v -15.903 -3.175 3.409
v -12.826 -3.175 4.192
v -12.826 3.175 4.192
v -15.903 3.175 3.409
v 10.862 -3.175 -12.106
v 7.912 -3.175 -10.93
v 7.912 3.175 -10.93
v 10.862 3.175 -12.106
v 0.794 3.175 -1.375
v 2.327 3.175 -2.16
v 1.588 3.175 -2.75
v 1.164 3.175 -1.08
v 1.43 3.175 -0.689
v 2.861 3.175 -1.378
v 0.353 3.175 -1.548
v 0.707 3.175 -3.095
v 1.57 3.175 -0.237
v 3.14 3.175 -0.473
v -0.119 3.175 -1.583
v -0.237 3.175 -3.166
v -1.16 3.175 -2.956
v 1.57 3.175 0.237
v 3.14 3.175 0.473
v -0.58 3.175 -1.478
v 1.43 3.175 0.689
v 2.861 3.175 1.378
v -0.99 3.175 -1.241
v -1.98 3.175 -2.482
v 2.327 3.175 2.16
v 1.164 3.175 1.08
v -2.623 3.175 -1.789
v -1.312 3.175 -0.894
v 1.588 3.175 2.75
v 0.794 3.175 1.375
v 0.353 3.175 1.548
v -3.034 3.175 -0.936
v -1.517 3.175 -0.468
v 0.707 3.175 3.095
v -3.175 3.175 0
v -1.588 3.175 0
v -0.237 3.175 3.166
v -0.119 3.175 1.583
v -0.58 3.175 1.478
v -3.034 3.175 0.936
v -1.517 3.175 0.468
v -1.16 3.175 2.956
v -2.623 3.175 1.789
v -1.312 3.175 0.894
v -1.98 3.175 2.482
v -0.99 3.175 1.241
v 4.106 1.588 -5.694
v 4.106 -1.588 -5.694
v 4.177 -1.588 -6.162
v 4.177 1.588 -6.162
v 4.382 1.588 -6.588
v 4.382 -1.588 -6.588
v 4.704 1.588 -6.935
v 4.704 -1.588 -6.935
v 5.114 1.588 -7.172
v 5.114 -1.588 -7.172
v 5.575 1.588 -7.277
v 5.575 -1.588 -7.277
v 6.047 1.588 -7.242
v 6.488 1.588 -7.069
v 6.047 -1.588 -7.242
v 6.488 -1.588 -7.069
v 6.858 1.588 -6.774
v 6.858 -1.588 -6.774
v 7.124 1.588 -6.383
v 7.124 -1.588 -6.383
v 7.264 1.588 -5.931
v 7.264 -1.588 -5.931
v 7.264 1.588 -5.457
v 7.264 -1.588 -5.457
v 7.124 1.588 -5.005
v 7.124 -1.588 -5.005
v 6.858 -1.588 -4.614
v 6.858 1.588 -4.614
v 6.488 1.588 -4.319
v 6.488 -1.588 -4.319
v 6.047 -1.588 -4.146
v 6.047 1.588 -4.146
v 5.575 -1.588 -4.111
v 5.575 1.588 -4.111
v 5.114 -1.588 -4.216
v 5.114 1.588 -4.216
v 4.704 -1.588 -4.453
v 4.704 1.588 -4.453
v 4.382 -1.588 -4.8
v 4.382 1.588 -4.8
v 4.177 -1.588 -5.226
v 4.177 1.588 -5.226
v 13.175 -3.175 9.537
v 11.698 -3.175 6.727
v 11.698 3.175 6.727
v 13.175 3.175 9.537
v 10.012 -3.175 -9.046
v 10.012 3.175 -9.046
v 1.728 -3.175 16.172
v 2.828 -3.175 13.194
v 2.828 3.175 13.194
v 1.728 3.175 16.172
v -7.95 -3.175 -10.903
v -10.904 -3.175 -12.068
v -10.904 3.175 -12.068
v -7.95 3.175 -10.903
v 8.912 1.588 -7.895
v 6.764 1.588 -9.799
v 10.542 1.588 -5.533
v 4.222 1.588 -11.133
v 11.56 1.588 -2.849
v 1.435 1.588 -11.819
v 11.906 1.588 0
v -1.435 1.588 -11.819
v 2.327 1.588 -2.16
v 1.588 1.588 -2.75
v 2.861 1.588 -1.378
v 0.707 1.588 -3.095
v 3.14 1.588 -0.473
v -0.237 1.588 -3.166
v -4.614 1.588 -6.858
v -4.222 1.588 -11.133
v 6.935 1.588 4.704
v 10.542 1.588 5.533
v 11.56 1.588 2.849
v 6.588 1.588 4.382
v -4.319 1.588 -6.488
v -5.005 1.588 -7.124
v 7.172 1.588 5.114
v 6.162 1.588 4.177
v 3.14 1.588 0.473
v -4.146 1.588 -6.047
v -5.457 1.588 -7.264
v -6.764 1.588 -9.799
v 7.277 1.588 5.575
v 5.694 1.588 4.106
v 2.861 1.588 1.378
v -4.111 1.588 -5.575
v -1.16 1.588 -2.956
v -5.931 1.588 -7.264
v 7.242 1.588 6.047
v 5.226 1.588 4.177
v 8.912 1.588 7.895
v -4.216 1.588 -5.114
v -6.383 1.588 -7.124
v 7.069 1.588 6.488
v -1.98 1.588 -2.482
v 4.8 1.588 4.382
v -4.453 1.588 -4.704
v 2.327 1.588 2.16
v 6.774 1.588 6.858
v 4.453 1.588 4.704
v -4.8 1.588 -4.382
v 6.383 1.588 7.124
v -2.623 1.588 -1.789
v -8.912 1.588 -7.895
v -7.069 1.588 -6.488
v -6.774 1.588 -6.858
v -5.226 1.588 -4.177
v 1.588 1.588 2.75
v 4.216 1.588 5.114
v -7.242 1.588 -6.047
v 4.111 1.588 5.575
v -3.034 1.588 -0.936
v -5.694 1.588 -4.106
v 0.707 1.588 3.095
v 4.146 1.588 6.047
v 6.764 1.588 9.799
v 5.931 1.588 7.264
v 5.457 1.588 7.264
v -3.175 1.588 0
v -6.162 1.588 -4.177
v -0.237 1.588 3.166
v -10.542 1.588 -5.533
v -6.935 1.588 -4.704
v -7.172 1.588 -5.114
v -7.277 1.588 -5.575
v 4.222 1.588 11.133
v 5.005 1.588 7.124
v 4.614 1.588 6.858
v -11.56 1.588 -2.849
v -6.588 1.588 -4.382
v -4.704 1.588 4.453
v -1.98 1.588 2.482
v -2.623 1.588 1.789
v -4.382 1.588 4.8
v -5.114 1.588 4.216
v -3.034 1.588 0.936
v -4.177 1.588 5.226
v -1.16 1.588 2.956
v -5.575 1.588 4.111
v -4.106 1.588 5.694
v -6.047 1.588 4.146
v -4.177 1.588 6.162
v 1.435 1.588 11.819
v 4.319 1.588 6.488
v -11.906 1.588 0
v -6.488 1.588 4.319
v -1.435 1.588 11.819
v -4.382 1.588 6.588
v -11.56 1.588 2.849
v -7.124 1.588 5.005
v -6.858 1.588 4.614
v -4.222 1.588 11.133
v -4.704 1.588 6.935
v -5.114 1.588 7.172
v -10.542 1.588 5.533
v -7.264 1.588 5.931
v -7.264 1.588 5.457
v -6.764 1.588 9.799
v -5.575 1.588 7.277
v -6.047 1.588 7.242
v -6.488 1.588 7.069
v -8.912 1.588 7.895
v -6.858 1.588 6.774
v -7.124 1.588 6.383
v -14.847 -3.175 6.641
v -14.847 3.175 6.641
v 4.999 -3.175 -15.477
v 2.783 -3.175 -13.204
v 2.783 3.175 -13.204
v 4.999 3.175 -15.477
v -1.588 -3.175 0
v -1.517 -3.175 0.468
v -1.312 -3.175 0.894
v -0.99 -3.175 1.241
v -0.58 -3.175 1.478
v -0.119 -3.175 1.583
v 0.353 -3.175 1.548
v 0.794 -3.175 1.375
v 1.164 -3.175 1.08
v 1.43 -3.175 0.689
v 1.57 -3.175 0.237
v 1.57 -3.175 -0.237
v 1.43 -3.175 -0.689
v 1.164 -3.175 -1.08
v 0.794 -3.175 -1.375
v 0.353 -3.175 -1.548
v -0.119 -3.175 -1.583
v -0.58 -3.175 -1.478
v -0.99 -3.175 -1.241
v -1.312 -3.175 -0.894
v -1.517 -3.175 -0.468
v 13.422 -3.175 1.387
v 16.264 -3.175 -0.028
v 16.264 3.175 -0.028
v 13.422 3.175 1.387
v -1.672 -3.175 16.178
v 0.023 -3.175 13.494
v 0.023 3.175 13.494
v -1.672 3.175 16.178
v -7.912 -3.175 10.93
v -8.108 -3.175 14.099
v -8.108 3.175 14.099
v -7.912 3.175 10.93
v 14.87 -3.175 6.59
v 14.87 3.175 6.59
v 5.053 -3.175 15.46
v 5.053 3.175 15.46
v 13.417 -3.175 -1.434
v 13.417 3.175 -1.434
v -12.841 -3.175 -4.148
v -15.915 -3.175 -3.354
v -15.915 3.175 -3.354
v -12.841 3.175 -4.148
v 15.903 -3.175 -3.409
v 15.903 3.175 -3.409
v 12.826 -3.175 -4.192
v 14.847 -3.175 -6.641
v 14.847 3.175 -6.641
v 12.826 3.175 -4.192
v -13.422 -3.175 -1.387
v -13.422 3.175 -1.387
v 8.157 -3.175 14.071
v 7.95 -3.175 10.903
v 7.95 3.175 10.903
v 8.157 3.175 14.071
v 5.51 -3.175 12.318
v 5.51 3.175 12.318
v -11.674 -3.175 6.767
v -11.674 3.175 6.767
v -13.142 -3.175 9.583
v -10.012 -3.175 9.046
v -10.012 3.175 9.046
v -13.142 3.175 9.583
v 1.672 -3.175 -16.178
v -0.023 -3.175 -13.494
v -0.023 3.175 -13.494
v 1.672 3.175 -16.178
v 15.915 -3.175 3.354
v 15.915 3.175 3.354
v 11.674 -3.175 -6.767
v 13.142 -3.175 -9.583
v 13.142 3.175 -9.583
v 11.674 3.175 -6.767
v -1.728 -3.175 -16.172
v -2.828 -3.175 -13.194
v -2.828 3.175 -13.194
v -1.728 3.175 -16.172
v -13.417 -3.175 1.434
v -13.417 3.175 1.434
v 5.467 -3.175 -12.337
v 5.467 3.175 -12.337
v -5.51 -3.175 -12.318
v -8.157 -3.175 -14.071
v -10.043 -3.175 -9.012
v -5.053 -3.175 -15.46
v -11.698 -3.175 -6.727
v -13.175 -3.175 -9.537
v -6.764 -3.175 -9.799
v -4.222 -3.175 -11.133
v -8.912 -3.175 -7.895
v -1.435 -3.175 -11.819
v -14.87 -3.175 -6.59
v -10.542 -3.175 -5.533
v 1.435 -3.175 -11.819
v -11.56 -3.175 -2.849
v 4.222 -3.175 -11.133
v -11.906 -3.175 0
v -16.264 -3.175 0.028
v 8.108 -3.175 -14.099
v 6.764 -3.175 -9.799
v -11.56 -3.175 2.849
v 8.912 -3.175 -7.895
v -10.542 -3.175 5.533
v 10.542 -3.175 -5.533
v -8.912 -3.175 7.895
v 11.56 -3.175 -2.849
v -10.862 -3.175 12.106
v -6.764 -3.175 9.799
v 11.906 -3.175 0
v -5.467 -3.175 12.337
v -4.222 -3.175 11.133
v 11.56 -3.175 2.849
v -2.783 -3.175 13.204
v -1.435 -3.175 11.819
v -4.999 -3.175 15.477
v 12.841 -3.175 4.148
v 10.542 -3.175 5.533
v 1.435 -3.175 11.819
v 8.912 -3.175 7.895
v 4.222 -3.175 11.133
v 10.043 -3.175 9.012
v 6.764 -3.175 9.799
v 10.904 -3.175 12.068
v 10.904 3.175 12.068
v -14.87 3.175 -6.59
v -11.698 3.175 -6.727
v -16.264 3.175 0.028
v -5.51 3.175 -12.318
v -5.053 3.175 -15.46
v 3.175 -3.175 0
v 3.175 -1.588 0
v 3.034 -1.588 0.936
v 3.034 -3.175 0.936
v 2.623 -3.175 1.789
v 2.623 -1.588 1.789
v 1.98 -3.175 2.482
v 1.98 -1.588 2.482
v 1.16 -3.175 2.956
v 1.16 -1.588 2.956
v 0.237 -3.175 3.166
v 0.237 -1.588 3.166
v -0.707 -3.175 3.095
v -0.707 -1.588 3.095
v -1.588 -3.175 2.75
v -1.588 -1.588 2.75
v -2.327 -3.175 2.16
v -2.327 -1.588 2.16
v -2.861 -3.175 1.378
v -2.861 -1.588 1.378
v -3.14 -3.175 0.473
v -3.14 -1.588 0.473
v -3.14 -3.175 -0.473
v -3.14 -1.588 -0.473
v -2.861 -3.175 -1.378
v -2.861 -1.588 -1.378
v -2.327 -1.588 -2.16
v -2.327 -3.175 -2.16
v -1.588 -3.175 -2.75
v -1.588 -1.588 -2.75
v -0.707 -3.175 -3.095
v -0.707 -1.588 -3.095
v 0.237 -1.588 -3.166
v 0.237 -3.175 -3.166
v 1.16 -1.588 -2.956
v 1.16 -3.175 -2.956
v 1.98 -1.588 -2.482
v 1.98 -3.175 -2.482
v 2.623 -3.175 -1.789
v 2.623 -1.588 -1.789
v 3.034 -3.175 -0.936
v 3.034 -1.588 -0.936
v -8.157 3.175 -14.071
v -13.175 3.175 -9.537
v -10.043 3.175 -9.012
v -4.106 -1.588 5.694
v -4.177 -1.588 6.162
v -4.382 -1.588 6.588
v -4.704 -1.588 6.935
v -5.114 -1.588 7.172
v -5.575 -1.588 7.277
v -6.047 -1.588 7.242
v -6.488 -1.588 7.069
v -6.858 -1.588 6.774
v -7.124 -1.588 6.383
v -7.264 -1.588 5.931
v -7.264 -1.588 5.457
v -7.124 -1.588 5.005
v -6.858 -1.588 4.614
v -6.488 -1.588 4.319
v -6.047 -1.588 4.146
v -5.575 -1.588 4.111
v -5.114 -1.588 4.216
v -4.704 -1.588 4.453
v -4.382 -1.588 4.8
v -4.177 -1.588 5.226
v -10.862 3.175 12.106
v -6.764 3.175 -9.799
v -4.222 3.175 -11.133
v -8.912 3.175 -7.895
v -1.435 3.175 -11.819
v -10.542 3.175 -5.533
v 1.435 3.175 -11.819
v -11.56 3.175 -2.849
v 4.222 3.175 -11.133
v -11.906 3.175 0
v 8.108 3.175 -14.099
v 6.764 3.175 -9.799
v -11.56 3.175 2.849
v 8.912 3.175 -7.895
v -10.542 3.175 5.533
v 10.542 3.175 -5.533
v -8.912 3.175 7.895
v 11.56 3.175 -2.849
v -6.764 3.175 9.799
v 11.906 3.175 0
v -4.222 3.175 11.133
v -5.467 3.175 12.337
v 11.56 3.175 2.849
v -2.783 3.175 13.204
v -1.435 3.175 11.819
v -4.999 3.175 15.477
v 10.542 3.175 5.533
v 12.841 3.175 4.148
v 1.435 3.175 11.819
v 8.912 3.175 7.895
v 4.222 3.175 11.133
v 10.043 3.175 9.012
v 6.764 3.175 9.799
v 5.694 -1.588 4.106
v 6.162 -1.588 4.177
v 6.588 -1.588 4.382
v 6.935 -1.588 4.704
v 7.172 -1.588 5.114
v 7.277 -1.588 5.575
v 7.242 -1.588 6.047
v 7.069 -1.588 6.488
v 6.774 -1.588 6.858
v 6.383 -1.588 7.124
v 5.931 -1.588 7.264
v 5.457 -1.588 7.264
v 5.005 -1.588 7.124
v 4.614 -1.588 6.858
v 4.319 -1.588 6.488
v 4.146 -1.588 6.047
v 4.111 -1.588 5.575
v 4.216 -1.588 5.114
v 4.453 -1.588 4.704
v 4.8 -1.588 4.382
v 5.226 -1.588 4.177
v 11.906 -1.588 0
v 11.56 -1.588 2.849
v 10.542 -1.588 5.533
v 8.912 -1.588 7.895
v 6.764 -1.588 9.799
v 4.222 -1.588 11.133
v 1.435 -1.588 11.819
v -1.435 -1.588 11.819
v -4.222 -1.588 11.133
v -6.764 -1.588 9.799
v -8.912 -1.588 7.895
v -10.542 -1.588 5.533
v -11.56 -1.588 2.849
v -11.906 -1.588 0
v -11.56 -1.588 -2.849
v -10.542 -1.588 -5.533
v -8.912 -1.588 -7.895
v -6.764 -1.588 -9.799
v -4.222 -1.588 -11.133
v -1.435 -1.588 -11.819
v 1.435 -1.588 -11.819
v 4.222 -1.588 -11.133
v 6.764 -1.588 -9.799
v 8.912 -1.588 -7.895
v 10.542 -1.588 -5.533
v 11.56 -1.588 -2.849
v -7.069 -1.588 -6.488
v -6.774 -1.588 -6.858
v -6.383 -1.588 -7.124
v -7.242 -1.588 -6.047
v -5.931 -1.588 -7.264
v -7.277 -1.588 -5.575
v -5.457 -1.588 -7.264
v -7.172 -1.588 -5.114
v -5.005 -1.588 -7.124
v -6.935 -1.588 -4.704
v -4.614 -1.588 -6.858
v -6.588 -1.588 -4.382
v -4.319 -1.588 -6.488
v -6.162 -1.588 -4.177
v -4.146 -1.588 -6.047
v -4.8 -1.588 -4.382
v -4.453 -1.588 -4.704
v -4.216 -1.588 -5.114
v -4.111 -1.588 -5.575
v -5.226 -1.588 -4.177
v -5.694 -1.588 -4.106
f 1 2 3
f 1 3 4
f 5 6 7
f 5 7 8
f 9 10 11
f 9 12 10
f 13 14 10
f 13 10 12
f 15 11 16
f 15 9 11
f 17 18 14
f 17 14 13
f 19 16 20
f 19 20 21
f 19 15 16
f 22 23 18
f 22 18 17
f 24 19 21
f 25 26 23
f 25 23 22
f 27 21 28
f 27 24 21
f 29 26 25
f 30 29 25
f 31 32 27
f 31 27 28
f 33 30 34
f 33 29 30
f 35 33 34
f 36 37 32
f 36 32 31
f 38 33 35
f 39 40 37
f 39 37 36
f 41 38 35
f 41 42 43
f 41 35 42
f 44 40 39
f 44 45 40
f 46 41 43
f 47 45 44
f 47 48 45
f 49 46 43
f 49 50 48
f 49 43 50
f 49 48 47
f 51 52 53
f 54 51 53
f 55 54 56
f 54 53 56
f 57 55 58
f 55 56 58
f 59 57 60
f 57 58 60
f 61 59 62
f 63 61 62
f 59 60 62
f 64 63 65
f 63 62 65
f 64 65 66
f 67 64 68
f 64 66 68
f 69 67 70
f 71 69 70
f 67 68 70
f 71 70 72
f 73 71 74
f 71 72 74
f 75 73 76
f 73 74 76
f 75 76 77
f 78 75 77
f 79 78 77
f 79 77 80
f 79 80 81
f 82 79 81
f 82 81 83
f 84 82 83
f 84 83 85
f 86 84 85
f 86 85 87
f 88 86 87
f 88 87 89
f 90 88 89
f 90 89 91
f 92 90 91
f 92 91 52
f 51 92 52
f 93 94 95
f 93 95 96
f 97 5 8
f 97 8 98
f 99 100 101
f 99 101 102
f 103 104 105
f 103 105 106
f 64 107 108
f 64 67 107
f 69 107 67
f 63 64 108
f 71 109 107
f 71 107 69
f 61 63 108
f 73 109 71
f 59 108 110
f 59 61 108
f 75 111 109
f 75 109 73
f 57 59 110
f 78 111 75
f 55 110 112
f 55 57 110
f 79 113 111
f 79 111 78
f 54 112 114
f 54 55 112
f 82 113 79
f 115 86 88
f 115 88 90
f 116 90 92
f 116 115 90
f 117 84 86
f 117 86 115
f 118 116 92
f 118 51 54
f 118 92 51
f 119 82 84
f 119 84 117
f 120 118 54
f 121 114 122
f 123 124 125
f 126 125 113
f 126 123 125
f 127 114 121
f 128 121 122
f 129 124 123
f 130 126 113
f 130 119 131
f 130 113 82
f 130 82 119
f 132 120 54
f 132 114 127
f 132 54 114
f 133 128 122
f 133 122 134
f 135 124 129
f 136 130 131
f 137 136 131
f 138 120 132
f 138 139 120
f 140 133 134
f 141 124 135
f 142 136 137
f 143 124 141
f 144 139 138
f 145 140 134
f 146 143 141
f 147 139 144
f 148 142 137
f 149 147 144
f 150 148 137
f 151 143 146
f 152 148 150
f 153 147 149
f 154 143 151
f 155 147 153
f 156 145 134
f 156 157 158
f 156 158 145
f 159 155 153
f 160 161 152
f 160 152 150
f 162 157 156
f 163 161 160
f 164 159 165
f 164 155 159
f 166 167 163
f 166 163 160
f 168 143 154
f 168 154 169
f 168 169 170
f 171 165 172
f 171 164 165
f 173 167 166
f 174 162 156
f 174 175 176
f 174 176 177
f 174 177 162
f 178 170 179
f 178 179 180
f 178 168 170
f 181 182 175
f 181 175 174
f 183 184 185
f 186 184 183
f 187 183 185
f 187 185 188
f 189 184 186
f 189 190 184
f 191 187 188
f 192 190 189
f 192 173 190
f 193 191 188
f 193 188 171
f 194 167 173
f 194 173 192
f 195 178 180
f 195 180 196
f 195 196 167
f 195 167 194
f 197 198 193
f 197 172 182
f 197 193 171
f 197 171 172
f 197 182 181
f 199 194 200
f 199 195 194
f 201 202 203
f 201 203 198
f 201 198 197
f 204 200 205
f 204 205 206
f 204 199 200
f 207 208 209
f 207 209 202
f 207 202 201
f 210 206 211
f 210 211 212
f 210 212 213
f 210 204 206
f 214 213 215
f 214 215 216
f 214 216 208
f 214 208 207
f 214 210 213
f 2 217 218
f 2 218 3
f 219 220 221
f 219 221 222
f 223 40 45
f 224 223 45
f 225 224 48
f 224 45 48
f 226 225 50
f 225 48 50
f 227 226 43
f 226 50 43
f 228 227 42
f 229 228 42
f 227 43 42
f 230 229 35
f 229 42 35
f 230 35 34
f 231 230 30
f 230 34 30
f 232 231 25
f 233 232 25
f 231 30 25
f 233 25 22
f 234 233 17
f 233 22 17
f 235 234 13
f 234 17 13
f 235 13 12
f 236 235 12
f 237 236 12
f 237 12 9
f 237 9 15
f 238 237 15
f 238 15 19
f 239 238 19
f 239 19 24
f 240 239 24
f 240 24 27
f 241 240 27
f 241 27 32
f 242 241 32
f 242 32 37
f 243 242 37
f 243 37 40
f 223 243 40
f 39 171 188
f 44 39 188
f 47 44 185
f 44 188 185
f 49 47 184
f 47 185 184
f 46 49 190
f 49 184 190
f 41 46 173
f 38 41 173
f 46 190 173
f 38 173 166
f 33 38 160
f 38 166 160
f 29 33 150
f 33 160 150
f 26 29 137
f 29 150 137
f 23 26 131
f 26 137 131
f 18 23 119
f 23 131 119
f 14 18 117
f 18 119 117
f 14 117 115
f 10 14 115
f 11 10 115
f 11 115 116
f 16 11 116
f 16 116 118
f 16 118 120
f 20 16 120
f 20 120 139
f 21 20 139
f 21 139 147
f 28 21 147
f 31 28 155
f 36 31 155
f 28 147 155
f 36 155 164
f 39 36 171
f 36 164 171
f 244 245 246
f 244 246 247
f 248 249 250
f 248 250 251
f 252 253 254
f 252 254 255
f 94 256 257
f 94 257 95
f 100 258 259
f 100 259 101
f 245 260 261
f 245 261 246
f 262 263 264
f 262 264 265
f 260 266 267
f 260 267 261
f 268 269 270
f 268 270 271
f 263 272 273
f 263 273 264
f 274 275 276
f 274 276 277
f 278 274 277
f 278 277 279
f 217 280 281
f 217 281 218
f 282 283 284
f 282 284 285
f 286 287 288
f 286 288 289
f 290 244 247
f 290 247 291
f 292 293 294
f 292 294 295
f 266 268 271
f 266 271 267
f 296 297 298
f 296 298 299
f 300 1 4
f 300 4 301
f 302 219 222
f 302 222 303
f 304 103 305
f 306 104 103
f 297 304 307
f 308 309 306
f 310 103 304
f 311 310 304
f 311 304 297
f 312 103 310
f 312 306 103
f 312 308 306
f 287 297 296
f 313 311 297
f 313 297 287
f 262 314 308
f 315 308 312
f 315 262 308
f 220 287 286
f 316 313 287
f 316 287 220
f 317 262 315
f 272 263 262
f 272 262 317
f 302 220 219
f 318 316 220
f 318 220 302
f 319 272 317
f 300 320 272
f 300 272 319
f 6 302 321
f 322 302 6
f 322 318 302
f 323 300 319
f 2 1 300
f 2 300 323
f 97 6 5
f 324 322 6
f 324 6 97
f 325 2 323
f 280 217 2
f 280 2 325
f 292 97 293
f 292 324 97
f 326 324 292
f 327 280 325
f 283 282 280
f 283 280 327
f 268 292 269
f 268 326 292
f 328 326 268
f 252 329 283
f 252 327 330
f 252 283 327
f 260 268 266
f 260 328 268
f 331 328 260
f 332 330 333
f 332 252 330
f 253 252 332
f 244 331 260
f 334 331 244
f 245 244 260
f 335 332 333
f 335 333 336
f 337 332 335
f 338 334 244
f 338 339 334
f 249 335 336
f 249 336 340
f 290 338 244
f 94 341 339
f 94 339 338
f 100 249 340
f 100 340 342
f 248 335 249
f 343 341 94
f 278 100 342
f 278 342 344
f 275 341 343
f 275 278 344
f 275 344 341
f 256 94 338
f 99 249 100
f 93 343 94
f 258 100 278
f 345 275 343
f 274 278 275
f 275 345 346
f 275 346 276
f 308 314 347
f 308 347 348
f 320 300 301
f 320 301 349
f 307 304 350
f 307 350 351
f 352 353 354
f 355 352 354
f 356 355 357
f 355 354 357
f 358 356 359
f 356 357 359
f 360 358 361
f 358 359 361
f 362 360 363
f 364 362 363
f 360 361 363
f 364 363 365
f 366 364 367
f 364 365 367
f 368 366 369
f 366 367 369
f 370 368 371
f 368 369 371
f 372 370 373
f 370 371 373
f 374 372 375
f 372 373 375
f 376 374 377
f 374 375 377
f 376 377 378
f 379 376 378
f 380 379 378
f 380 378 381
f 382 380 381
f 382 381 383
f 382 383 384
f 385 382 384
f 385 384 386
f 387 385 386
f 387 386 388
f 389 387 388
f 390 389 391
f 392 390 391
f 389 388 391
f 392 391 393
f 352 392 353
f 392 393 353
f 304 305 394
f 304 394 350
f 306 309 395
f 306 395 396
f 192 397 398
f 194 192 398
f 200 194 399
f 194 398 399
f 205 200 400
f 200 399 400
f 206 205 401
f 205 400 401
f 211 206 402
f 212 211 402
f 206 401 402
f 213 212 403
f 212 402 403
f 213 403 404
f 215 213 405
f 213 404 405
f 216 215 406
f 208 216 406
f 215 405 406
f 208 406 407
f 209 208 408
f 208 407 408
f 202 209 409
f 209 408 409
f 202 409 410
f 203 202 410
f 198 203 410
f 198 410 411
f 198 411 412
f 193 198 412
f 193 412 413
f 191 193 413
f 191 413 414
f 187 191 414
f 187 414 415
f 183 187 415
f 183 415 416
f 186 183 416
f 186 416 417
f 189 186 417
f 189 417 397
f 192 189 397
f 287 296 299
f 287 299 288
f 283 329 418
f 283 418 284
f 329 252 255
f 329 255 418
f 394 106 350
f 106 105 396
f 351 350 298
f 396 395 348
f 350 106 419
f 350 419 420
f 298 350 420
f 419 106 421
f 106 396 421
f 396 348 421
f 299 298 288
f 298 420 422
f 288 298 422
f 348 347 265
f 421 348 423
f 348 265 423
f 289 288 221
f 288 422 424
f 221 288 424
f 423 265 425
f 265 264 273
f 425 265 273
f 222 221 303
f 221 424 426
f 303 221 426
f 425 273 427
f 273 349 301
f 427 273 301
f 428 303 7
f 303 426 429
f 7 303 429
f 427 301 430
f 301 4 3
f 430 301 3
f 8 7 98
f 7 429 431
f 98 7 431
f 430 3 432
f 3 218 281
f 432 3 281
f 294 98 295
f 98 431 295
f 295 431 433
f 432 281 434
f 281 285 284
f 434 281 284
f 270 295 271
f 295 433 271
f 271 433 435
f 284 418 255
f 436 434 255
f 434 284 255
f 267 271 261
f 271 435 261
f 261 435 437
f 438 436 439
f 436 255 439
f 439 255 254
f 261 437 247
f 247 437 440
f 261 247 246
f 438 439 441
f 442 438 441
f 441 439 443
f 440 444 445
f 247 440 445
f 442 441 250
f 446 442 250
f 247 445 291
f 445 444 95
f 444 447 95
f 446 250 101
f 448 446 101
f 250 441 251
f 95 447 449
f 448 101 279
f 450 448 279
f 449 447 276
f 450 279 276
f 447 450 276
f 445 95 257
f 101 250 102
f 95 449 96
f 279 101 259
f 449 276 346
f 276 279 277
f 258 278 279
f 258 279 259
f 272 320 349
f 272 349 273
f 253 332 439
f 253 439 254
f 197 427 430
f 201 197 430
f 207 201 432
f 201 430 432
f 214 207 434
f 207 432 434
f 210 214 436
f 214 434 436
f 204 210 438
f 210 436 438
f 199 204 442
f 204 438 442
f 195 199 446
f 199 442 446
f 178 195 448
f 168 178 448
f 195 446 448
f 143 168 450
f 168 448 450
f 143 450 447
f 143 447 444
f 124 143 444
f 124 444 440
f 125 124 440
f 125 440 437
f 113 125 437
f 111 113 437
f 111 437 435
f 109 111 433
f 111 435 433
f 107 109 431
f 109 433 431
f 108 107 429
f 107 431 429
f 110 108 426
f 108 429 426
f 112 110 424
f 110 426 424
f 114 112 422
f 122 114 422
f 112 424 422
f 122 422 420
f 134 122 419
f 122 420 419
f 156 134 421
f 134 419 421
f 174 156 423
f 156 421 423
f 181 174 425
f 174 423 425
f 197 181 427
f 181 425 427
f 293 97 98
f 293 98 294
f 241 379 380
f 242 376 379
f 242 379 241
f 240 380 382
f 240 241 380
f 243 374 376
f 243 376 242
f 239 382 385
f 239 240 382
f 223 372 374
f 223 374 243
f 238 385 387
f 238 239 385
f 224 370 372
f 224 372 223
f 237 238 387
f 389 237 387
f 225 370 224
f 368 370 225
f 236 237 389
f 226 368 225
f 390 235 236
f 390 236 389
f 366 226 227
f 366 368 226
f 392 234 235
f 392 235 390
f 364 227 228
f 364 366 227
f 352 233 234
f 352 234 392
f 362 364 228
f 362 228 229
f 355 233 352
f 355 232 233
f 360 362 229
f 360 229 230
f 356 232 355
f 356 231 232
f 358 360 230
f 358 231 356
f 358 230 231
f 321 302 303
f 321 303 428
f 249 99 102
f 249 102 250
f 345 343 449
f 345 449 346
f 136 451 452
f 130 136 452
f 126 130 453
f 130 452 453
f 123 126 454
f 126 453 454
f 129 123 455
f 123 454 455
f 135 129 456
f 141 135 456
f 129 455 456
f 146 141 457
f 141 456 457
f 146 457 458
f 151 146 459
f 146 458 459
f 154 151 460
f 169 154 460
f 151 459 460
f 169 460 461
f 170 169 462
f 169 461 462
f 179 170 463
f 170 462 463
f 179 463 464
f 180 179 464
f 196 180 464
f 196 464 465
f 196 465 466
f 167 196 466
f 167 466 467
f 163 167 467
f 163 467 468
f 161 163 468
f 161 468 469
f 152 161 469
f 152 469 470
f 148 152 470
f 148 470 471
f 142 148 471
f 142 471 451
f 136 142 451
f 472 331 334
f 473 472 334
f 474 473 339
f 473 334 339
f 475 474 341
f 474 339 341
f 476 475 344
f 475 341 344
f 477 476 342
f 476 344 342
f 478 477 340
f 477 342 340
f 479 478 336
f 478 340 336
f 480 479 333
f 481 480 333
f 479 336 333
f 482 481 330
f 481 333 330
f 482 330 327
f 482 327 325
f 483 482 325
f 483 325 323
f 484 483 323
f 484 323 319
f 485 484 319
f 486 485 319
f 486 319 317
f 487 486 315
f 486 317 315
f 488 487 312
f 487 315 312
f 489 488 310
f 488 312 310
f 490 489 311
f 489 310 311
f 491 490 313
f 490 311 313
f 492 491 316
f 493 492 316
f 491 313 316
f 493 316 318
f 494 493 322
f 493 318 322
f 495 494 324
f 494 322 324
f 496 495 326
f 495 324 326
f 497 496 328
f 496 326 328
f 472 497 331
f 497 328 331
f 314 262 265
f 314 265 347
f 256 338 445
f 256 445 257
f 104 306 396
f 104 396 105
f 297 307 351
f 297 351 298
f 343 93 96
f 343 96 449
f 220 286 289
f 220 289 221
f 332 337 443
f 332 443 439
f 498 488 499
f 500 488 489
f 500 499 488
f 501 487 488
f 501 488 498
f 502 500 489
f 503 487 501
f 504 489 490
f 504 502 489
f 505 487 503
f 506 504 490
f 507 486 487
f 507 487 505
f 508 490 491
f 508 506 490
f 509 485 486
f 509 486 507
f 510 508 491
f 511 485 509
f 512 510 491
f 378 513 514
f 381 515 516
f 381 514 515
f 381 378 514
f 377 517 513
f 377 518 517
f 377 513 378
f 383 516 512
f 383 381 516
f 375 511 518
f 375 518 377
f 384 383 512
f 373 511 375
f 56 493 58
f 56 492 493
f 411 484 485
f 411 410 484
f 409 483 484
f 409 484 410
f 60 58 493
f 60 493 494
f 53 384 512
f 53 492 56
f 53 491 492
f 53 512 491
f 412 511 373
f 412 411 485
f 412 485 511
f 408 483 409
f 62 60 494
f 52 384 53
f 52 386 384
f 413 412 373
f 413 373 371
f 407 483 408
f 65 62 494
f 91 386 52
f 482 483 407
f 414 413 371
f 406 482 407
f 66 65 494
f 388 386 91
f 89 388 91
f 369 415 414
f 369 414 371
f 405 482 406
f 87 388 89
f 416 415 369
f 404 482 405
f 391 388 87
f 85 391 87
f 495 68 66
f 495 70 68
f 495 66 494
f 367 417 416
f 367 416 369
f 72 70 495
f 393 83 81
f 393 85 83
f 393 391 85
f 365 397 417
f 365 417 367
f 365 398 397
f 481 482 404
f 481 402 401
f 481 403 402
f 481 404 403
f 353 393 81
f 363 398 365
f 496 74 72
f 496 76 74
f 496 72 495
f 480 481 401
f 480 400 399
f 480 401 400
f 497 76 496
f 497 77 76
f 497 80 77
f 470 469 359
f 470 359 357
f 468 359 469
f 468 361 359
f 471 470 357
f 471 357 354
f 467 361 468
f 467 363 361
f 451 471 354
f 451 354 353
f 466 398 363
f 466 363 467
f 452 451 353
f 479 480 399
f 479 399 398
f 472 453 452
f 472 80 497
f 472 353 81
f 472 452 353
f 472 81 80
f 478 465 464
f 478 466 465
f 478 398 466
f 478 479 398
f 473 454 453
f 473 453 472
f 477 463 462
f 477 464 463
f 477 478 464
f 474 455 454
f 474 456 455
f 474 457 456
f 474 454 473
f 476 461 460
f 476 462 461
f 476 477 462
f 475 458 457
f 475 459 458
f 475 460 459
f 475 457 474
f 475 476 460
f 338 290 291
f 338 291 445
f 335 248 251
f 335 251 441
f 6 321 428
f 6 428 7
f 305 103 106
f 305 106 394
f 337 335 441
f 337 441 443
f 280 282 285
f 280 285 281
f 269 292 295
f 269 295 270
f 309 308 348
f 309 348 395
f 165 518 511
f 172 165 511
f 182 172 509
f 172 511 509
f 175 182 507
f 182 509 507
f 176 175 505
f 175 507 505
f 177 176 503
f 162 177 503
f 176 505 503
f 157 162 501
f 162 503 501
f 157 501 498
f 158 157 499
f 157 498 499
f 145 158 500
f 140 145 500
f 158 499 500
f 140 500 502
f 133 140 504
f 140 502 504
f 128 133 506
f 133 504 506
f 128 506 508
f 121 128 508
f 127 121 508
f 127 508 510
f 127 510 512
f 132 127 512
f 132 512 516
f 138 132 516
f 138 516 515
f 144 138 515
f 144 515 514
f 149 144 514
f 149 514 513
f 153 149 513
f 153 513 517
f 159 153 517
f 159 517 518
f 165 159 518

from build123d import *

# Parameters (mm, degrees)
F0_R            = 13.49375
F1_DEPTH        = 3.175
F3_DEPTH        = 6.35
F3_COPIES_COUNT = 30
F4_R            = 11.90625
F5_DEPTH        = 1.5875
F6_R            = 11.90625
F7_DEPTH        = 1.5875
F8_R            = 1.5875
F9_DEPTH        = 4.7635
F9_COPIES_COUNT = 4
F10_R           = 3.175
F11_DEPTH       = 1.5875
F12_R           = 3.175
F13_DEPTH       = 1.5875
F14_R           = 1.5875
F15_DEPTH       = 6.351


# Not quite as in the source:
# - a pattern or mirror of a feature is missing from the dataset's text; its kind, count and spacing are read off the source's solid


with BuildPart() as f1:
    # F0 (on Front) → F1 (new body, symmetric)
    with BuildSketch(Plane.XZ):
        Circle(F0_R)
    extrude(amount=F1_DEPTH, both=True)

    # F2 (on face) → F3 (join)
    with BuildSketch(Plane.XZ.offset(3.175)):
        with BuildLine():
            Line((1.7281408885, 16.1722566911), (0.0234068474, 13.4937296987))
            ThreePointArc((0.0234068474, 13.4937296987), (1.4337574514, 13.4173629538), (2.8283995087, 13.1939927725))
            Line((2.8283995087, 13.1939927725), (1.7281408885, 16.1722566911))
        make_face()
    f3 = extrude(amount=-F3_DEPTH)

    # F3_copies: F3 ×30 about axis
    f3_copies_axis = Axis((0, 0, 0), (0, 1, 0))
    for i in range(1, F3_COPIES_COUNT):
        add(f3.rotate(f3_copies_axis, i * 360 / F3_COPIES_COUNT))

    # F4 (on face) → F5 (cut)
    with BuildSketch(Plane.XZ.offset(3.175)):
        Circle(F4_R)
    extrude(amount=-F5_DEPTH, mode=Mode.SUBTRACT)

    # F6 (on face) → F7 (cut)
    with BuildSketch(Plane(origin=(0, 3.175, 0), x_dir=(-1, 0, 0), z_dir=(0, 1, 0))):
        Circle(F6_R)
    extrude(amount=-F7_DEPTH, mode=Mode.SUBTRACT)

    # F8 (on face) → F9 (cut, through all)
    with BuildSketch(Plane.XZ.offset(1.5875)):
        with Locations((-5.6939616362, 5.6939616362)):
            Circle(F8_R)
    f9 = extrude(amount=-F9_DEPTH, mode=Mode.SUBTRACT)

    # F9_copies: F9 ×4 about axis
    f9_copies_axis = Axis((0, 0, 0), (0, 1, 0))
    for i in range(1, F9_COPIES_COUNT):
        add(f9.rotate(f9_copies_axis, i * 360 / F9_COPIES_COUNT), mode=Mode.SUBTRACT)

    # F10 (on face) → F11 (join)
    with BuildSketch(Plane.XZ.offset(1.5875)):
        Circle(F10_R)
    extrude(amount=F11_DEPTH)

    # F12 (on face) → F13 (join)
    with BuildSketch(Plane(origin=(0, 1.5875, 0), x_dir=(-1, 0, 0), z_dir=(0, 1, 0))):
        Circle(F12_R)
    extrude(amount=F13_DEPTH)

    # F14 (on face) → F15 (cut, through all)
    with BuildSketch(Plane(origin=(0, 3.175, 0), x_dir=(-1, 0, 0), z_dir=(0, 1, 0))):
        Circle(F14_R)
    extrude(amount=-F15_DEPTH, mode=Mode.SUBTRACT)


solid = f1.part
